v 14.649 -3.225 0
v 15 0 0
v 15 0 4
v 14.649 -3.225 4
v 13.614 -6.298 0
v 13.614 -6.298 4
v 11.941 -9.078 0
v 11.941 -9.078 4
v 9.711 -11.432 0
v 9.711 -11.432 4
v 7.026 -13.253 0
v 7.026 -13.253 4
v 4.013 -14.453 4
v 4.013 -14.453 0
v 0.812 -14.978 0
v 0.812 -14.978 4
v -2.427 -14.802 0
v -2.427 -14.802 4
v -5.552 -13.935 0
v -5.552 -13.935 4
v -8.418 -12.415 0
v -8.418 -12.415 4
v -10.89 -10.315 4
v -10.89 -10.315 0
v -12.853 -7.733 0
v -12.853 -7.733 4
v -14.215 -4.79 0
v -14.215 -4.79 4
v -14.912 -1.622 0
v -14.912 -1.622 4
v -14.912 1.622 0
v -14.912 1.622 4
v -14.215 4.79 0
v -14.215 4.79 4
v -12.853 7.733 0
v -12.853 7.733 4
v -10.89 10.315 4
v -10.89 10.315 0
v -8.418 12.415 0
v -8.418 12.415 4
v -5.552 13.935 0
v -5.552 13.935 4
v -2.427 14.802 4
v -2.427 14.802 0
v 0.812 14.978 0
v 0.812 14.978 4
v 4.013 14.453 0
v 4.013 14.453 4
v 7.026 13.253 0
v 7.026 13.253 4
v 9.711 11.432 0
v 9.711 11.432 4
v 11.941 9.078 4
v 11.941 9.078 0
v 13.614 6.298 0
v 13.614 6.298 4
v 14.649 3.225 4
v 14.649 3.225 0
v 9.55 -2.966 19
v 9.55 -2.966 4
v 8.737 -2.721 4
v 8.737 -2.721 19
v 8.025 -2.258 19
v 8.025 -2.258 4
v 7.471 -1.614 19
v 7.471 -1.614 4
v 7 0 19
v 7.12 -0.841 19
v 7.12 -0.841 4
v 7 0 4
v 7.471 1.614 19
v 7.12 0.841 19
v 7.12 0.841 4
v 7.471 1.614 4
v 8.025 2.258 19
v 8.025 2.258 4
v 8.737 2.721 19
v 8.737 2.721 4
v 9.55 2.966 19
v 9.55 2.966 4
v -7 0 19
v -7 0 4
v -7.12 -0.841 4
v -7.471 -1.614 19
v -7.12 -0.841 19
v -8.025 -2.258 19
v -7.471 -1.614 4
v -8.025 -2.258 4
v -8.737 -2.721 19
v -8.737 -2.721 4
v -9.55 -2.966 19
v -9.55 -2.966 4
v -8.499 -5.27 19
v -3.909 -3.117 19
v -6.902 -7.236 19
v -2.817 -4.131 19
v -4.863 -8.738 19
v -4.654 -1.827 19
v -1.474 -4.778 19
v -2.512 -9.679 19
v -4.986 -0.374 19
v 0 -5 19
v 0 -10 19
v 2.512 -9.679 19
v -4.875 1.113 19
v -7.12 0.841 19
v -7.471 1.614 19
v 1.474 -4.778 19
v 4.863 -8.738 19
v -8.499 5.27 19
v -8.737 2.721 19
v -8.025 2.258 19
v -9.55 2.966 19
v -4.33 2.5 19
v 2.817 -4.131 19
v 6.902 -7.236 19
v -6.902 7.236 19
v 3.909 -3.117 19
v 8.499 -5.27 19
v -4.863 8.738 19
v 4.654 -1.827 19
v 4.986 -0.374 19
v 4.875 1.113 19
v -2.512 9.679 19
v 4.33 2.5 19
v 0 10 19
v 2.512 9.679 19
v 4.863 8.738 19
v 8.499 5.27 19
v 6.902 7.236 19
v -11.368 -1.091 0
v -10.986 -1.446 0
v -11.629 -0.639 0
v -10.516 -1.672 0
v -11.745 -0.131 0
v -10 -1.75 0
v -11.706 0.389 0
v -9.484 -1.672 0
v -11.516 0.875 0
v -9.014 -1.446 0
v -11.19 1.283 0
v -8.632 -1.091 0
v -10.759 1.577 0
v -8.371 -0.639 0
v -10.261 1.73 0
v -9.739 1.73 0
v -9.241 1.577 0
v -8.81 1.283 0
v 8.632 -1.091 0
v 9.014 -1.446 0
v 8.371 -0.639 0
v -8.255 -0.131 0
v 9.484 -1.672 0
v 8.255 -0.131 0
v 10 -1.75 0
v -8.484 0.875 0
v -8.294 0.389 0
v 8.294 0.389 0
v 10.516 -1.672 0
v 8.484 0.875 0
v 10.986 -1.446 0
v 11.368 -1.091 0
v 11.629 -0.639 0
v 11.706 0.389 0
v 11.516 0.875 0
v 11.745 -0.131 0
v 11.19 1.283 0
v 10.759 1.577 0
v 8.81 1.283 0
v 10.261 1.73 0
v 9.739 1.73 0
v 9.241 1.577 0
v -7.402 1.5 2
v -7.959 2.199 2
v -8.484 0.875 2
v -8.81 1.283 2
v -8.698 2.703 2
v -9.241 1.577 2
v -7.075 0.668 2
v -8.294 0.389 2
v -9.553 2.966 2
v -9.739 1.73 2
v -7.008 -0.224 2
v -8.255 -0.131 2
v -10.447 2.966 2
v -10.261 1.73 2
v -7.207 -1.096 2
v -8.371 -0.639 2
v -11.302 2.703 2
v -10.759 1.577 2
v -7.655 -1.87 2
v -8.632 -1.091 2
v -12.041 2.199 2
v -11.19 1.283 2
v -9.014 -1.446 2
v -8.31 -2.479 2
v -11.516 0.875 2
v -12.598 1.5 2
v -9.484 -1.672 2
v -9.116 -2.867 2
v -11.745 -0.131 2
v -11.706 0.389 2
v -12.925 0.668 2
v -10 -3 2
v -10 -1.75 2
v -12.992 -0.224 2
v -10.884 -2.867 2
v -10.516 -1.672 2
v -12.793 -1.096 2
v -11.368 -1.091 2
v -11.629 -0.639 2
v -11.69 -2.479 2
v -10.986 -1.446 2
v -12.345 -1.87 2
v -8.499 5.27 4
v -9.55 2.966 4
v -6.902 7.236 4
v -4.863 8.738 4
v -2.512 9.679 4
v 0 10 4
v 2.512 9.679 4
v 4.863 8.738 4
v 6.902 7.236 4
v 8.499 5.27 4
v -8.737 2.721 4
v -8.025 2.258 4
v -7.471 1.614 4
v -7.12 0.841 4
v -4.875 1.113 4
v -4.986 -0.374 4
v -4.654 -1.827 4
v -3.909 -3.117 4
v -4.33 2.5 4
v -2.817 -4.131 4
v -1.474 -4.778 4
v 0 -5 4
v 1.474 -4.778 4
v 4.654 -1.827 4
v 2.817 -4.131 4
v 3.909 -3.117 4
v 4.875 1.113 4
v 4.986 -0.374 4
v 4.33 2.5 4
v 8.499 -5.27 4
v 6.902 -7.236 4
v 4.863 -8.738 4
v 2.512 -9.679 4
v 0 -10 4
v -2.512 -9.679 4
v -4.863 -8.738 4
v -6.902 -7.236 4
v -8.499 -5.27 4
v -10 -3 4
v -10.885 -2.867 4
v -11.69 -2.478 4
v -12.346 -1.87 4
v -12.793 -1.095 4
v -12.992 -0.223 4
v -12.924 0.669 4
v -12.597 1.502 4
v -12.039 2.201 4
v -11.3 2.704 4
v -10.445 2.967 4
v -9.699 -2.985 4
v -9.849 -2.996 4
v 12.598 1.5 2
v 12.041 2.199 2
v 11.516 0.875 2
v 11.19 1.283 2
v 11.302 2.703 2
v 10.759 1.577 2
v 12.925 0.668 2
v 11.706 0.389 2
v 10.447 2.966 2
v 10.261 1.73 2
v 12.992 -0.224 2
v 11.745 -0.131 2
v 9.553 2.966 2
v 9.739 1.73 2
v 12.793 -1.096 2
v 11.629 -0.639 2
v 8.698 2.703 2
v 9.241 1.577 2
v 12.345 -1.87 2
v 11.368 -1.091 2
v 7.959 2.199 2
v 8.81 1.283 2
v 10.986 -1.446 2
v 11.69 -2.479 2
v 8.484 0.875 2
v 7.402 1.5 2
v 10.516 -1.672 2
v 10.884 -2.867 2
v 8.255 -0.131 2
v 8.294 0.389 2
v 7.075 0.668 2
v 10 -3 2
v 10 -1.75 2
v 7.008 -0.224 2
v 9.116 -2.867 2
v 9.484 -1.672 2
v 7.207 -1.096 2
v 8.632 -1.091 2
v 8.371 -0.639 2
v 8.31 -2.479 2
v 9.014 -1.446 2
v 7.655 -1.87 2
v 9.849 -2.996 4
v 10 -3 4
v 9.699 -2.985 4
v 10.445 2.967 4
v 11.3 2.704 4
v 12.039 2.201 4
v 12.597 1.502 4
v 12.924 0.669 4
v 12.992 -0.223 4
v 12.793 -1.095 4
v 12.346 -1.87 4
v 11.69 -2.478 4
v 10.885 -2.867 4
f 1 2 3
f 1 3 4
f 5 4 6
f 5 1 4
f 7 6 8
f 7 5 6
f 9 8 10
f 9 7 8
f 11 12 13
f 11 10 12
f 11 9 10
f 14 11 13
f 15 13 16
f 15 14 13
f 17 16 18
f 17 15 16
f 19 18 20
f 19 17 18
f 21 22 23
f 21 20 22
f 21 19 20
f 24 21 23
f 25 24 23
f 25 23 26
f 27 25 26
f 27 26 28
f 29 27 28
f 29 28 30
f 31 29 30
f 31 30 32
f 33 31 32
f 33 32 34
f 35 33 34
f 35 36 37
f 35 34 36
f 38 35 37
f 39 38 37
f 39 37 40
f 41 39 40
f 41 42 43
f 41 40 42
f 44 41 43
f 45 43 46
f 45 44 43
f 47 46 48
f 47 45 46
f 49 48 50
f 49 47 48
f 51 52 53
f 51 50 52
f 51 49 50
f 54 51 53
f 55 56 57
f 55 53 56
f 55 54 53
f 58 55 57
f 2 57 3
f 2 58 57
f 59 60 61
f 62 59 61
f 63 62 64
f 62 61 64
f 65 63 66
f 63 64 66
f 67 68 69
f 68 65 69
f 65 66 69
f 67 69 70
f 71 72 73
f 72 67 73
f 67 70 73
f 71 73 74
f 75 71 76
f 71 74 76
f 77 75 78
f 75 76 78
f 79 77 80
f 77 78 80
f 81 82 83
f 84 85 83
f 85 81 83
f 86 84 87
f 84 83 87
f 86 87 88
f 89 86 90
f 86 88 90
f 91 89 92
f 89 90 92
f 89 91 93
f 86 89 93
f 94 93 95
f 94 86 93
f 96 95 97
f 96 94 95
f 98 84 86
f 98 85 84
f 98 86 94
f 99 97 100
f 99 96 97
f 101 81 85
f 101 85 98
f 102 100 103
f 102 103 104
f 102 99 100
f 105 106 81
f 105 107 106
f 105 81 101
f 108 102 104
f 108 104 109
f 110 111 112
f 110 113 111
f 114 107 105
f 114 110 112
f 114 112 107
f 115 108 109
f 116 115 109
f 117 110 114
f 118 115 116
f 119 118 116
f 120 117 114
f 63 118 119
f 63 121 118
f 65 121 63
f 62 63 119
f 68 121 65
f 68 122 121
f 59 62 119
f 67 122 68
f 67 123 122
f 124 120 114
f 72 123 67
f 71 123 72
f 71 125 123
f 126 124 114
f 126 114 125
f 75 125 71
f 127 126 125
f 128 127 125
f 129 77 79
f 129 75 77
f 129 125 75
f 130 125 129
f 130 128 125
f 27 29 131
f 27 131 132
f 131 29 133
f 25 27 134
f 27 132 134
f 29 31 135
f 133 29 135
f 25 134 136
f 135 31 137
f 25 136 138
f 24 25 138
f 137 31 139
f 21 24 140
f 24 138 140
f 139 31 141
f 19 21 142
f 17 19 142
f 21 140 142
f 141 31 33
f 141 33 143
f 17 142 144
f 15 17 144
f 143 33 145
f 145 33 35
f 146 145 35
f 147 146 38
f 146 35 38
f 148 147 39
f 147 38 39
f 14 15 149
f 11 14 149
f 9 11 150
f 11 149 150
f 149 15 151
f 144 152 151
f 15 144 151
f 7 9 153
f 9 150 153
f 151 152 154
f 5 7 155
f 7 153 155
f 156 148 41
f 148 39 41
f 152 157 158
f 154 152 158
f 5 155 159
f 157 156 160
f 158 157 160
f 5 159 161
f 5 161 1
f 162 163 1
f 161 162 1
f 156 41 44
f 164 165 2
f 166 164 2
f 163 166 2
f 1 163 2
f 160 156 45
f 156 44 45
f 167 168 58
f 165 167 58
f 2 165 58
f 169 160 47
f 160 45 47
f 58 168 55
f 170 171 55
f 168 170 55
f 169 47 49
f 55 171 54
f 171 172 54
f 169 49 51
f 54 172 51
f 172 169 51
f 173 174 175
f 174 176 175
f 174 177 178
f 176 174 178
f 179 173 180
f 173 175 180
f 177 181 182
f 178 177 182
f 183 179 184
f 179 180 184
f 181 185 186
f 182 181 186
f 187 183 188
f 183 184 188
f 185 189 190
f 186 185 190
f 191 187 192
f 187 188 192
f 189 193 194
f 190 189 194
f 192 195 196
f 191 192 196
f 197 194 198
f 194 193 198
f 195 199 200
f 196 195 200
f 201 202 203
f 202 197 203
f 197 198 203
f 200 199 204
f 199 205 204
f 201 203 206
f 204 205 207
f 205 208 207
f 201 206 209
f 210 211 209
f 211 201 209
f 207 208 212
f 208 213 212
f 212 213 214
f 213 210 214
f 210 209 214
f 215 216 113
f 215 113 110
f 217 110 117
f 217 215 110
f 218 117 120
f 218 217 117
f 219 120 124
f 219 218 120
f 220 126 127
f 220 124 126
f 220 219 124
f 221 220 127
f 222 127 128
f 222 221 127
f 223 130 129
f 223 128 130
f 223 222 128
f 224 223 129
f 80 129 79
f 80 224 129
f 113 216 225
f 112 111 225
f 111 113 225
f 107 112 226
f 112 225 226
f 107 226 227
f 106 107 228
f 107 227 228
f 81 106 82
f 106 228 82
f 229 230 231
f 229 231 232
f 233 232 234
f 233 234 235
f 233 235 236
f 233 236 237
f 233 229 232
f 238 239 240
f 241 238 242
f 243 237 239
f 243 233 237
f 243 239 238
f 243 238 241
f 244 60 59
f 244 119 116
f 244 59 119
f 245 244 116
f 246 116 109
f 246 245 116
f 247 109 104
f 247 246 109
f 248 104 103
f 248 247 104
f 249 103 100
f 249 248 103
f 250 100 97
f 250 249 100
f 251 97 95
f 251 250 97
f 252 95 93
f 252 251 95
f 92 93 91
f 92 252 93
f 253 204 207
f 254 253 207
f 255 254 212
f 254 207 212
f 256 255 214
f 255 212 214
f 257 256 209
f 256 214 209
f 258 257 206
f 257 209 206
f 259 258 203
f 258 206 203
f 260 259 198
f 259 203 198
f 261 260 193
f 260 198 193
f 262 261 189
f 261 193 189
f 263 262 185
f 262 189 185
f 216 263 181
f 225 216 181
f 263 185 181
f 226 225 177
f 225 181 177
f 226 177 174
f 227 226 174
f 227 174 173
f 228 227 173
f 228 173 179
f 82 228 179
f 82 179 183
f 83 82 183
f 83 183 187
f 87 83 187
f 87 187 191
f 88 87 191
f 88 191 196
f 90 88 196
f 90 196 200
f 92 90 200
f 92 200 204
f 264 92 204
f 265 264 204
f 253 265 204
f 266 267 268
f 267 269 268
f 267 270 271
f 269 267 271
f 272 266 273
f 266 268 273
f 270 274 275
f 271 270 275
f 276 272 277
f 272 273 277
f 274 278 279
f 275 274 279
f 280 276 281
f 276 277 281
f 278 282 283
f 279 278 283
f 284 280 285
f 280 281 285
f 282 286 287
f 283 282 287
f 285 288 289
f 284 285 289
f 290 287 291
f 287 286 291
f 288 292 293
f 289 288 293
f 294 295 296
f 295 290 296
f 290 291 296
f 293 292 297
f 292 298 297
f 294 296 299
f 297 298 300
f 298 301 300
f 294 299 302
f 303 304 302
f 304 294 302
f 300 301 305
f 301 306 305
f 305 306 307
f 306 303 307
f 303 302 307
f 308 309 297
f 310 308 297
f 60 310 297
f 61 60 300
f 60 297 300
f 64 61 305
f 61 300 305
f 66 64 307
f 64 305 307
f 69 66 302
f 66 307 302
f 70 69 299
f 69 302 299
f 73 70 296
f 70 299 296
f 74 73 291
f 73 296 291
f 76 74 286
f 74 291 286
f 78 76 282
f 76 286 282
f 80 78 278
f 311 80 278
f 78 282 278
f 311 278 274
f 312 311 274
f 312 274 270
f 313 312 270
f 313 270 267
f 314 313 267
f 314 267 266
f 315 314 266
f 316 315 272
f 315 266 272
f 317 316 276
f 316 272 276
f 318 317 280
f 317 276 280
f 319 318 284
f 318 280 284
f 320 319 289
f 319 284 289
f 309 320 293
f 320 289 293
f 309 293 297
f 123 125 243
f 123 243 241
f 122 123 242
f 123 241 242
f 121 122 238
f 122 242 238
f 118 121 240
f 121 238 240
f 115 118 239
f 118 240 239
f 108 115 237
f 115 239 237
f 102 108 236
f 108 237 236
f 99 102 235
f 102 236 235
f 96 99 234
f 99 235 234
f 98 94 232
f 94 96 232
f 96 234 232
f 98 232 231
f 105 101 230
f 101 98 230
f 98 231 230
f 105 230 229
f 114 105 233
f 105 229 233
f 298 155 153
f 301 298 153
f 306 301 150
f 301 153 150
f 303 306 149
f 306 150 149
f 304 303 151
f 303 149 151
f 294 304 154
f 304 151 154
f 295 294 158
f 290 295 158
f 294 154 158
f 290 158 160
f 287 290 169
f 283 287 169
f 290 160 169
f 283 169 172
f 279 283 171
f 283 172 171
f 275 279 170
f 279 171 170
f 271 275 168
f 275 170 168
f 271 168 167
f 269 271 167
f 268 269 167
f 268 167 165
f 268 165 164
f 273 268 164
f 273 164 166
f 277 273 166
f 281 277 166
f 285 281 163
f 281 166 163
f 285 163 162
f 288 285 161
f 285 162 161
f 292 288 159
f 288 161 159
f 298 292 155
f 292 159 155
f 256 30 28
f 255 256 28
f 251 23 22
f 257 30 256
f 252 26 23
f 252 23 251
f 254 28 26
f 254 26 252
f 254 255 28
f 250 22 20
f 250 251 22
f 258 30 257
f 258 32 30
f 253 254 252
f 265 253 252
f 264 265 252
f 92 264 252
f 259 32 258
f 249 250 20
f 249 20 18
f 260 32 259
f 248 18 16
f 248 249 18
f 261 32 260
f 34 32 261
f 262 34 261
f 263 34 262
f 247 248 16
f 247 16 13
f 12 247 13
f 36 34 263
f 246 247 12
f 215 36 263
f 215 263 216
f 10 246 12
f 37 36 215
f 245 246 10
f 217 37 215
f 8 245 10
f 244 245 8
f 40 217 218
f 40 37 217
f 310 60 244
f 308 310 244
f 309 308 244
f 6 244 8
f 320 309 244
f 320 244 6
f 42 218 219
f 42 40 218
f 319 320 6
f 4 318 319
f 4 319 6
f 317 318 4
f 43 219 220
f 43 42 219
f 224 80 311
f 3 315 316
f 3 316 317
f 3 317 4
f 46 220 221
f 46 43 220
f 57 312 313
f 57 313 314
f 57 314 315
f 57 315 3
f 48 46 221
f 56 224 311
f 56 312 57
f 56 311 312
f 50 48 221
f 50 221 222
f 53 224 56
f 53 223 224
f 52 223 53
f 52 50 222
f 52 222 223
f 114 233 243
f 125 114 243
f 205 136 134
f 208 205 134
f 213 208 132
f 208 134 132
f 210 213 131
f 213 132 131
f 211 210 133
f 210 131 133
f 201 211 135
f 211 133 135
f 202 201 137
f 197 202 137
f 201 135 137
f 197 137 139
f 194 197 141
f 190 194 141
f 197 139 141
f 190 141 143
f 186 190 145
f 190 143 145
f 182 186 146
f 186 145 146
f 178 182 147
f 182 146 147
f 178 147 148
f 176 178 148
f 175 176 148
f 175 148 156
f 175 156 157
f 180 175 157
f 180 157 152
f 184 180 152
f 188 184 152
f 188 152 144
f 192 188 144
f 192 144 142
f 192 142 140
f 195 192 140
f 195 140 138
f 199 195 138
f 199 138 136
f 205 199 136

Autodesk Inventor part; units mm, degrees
ref_plane "YZ Plane" through (0, 0, 0) normal (1, 0, 0) x (0, 1, 0)
ref_plane "XZ Plane" through (0, 0, 0) normal (0, 1, 0) x (-1, 0, 0)
ref_plane "XY Plane" through (0, 0, 0) normal (0, 0, 1) x (1, 0, 0)
sketch "Sketch1" plane through (0, 0, 0) normal (0, 0, 1) x (1, 0, 0)
  circle A0 centre (0, 0) radius 15
  dimension "d0" = 30
extrude "Extrusion1" add sketch "Sketch1" along normal blind 4
sketch "Sketch2" plane through (0, 0, 4) normal (0, 0, 1) x (1, 0, 0)
  circle A0 centre (0, 0) radius 10 construction
  line L0 (0, 0) -> (-11.9207, 0) construction
  point P0 (-10, 0)
  point P1 (10, 0)
  dimension "d10" = 20
hole "Hole1" at (-10, 0, 4) at (10, 0, 4) direction (0, 0, -1) diameter 3.5 end through all counterbore diameter 6 counterbore depth 2
sketch "Sketch4" plane through (0, 0, 4) normal (0, 0, 1) x (1, 0, 0)
  arc A0 (-4.3301, 2.5) -> (4.3301, 2.5) centre (0, 0) ccw
  line L0 (-4.3301, 2.5) -> (4.3301, 2.5)
  circle A1 centre (10, 0) radius 3 projected
  arc A2 (9.55, 2.9661) -> (9.55, -2.9661) centre (10, 0) ccw
  circle A3 centre (-10, 0) radius 3 projected
  arc A4 (-9.5586, -2.9382) -> (-9.5586, 2.9382) centre (-10, 0) ccw
  arc A5 (-9.5586, -2.9382) -> (9.55, -2.9661) centre (0, 0) ccw
  arc A6 (9.55, 2.9661) -> (-9.5586, 2.9382) centre (0, 0) ccw
  point P0 (9.55, 2.9661)
  point P1 (-9.55, 2.9661)
  point P2 (-9.55, -2.9661)
  dimension "d12" = 10
  dimension "d13" = 2.5
  dimension "d14" = 10
  dimension "d15" = 10
extrude "Extrusion2" add sketch "Sketch4" along normal blind 15 contours A1 A5 A3 A6
equation "\"d15\" = d14"
properties part number "Motor-mount"
